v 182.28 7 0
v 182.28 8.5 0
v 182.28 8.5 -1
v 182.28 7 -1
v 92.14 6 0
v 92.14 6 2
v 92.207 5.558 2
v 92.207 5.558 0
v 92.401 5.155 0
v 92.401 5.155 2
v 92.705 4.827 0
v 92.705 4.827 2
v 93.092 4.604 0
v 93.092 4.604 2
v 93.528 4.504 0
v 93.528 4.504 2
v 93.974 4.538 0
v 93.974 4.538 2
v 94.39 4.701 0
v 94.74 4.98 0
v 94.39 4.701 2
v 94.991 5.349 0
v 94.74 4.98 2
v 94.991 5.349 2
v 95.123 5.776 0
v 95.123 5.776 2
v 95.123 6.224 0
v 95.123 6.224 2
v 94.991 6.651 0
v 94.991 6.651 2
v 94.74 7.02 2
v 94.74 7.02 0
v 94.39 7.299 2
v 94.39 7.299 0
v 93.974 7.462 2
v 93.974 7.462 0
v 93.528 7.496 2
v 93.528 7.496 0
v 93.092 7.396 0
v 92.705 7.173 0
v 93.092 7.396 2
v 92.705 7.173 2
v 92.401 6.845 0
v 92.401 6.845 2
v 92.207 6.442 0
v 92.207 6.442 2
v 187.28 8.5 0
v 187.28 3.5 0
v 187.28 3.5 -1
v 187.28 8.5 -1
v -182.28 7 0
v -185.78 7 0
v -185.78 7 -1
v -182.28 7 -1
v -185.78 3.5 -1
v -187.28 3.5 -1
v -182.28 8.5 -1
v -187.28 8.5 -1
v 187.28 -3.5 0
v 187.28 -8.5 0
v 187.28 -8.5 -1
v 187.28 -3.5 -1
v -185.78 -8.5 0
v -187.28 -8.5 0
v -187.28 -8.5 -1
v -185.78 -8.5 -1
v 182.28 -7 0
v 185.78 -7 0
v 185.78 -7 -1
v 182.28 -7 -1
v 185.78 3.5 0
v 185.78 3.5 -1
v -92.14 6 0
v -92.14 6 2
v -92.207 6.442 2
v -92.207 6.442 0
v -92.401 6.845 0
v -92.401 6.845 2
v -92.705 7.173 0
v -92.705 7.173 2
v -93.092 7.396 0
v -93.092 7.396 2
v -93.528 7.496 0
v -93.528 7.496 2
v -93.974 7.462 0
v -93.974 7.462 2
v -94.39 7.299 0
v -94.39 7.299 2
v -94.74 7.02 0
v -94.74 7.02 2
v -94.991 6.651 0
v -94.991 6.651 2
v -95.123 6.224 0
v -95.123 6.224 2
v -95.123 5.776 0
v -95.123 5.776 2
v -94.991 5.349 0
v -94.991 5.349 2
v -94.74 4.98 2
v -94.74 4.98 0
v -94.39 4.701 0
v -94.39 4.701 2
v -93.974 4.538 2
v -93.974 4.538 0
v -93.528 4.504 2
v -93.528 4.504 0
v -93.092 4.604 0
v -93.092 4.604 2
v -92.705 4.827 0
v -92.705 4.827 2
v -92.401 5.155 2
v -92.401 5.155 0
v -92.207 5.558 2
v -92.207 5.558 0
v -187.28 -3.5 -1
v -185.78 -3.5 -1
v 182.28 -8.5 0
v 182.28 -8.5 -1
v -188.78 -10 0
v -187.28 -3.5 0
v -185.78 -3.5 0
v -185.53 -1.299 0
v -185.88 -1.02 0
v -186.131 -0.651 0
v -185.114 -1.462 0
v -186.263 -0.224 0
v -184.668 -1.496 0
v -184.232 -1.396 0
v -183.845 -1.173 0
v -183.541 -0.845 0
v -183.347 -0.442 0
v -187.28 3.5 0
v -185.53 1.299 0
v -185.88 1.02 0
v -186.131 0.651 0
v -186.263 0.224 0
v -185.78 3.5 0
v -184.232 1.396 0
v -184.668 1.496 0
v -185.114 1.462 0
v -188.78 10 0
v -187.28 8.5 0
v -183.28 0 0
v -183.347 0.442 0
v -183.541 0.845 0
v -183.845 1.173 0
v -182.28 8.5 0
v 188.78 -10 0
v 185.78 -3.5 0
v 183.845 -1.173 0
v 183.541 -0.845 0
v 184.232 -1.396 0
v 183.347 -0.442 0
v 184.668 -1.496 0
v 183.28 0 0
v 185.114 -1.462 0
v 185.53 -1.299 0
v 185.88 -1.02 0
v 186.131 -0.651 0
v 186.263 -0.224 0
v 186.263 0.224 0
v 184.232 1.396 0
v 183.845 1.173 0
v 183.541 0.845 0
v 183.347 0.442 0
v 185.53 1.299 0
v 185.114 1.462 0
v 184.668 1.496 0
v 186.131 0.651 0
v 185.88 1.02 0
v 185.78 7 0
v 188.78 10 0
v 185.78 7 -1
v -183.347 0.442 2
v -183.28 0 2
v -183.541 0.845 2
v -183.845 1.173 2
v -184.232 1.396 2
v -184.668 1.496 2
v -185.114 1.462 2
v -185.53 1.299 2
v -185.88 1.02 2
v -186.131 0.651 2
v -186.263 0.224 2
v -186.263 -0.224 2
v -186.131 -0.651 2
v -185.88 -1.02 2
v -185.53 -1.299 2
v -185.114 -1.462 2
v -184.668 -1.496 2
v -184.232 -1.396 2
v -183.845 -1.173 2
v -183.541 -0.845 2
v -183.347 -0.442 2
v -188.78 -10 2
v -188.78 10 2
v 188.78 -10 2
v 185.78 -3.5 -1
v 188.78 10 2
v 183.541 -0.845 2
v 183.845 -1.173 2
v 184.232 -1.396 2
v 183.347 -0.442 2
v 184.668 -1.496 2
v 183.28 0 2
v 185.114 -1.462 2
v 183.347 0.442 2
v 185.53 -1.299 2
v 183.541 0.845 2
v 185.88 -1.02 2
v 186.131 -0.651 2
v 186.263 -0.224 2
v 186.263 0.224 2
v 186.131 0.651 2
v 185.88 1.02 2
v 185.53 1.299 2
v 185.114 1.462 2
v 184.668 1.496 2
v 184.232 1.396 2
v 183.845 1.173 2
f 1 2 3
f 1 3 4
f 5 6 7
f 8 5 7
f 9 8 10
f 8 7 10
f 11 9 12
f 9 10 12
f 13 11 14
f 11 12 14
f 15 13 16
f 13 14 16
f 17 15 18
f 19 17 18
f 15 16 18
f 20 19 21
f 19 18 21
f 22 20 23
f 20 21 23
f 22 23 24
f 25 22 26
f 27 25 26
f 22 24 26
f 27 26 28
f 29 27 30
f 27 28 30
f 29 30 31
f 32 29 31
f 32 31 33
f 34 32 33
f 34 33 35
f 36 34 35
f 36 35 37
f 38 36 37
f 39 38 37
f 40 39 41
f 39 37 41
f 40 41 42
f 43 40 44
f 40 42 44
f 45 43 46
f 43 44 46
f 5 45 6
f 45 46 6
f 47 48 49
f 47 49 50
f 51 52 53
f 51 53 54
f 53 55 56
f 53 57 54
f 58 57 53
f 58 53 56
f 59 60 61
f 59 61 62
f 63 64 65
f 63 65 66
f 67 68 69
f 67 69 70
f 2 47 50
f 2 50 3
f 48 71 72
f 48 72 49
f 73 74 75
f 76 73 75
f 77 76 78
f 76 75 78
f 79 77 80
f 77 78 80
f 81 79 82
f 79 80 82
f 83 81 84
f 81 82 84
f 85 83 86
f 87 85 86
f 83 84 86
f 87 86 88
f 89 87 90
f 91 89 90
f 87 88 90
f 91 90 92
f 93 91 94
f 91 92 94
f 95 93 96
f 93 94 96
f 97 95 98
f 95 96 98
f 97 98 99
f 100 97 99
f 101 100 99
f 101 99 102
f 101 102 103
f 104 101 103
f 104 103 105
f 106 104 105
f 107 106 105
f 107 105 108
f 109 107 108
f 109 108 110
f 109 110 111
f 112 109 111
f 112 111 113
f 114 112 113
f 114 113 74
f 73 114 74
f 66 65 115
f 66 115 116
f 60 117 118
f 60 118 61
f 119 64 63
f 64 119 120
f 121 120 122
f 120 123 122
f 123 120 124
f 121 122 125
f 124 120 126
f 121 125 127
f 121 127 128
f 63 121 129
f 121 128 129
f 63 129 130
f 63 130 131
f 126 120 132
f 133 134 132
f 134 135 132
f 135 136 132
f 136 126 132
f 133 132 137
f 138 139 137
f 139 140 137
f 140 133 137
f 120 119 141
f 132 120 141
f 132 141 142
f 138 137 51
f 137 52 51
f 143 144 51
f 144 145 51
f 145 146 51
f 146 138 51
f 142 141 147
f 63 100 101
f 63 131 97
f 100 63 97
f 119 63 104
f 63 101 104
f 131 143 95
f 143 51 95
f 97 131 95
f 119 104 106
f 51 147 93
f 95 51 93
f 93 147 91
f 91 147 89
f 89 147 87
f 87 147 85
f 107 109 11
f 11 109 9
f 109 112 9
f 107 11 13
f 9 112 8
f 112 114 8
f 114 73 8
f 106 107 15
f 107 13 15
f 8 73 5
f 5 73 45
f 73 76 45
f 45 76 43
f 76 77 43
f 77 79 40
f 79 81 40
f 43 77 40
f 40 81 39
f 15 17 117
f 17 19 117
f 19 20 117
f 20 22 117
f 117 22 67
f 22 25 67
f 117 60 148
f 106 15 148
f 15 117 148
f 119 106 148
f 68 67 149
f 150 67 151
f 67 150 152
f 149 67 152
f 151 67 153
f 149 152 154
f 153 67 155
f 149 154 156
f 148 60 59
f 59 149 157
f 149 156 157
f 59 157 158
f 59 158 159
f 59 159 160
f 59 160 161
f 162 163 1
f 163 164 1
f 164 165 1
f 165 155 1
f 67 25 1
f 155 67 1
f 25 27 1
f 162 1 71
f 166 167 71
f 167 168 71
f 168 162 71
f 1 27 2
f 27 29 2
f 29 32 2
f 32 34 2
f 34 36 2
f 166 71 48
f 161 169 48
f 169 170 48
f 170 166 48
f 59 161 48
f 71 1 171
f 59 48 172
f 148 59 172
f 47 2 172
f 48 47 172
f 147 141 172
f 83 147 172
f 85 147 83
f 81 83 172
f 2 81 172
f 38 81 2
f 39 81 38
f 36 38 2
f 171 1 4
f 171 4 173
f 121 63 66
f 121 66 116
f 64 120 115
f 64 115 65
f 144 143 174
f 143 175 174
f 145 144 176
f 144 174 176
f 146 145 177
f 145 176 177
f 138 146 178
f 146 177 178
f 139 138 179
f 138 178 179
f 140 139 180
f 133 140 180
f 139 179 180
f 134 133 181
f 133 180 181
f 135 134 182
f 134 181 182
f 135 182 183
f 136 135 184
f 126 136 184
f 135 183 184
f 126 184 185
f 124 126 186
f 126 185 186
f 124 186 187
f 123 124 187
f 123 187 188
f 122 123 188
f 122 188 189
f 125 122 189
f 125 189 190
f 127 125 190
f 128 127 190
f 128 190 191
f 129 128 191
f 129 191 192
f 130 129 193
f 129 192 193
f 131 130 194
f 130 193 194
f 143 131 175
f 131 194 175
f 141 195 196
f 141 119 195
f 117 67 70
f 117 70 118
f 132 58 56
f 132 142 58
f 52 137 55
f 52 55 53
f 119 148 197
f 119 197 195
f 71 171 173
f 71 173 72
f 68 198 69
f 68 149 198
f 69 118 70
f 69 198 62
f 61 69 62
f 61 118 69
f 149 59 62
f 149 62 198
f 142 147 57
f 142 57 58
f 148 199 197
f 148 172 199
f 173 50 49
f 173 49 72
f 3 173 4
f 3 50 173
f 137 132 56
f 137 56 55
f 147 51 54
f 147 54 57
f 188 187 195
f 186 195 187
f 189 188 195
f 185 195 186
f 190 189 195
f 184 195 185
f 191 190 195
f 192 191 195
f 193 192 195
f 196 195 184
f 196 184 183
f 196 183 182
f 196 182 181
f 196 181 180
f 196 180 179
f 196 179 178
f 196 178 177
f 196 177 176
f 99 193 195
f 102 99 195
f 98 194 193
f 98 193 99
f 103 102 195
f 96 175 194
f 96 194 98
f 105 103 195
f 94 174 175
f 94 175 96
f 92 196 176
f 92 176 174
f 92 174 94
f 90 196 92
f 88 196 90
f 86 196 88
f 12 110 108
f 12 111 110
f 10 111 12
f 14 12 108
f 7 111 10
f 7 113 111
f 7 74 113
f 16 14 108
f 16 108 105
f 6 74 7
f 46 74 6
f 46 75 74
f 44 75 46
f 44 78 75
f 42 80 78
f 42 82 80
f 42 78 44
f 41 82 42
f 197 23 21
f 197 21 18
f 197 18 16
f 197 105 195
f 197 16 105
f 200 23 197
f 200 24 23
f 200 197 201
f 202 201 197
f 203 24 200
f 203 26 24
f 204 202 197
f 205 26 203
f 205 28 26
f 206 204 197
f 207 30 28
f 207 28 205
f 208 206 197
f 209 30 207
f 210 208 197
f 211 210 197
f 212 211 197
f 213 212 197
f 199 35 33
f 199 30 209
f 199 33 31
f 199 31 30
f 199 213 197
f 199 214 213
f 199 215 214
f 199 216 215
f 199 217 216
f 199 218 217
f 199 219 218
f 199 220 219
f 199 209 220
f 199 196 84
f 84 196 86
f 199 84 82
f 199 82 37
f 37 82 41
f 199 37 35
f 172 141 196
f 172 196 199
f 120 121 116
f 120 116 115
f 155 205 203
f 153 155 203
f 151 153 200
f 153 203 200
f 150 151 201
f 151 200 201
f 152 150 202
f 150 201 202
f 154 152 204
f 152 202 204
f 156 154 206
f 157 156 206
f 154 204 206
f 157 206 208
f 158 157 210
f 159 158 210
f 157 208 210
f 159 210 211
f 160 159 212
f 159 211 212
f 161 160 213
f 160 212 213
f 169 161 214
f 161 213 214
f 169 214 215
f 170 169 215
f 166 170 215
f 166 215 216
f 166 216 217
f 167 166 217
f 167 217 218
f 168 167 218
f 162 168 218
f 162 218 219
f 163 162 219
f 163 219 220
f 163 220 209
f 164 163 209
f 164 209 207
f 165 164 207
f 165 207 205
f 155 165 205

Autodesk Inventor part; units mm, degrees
ref_plane "YZ Plane" through (0, 0, 0) normal (1, 0, 0) x (0, 1, 0)
ref_plane "XZ Plane" through (0, 0, 0) normal (0, 1, 0) x (-1, 0, 0)
ref_plane "XY Plane" through (0, 0, 0) normal (0, 0, 1) x (1, 0, 0)
sketch "Skizze1" plane through (0, 0, 0) normal (0, 0, 1) x (1, 0, 0)
  line L0 (-188.78, 10) -> (188.78, 10)
  line L1 (188.78, 10) -> (188.78, -10)
  line L2 (188.78, -10) -> (-188.78, -10)
  line L3 (-188.78, -10) -> (-188.78, 10)
  line L4 (0, -14) -> (0, 14) construction
  line L5 (-264.292, 0) -> (264.292, 0) construction
  point P0 (0, 0)
  dimension "d0" = 377.56
  dimension "d1" = 20
extrude "Extrusion1" add sketch "Skizze1" along normal blind 2
sketch "Skizze3" plane through (0, 0, 2) normal (0, 0, 1) x (1, 0, 0)
  circle A0 centre (-184.78, 0) radius 1.5
  line L0 (-188.78, 10) -> (-188.78, -10) projected
  line L1 (-264.292, 0) -> (264.292, 0) projected
  circle A1 centre (-93.64, 6) radius 1.5
  line L2 (188.78, 10) -> (-188.78, 10) projected
  line L3 (0, -14) -> (0, 14) projected
  point P0 (0, 0)
  dimension "d8" = 3
  dimension "d9" = 4
  dimension "d10" = 3
  dimension "d11" = 4
  dimension "d12" = 95.14
  dimension "d13" = 93.64
extrude "Extrusion3" cut sketch "Skizze3" against normal through all contours L1 A0 | A0 L1 | A1
mirror "Spiegeln2" about plane through (0, 0, 0) normal (1, 0, 0) of "Extrusion3"
sketch "Skizze4" plane through (0, 0, 0) normal (0, 0, -1) x (-1, 0, 0)
  line L0 (187.28, 8.2503) -> (187.28, 3.5)
  line L1 (187.28, 3.5) -> (185.78, 3.5)
  line L2 (185.78, 3.5) -> (185.78, 7)
  line L3 (185.78, 7) -> (182.28, 7)
  line L4 (182.28, 7) -> (182.28, 8.5)
  line L5 (182.28, 8.5) -> (187.28, 8.5)
  line L6 (187.28, 8.5) -> (187.28, 8.2503)
  line L7 (188.78, 10) -> (188.78, -10) projected
  line L8 (-188.78, 10) -> (188.78, 10) projected
  point P0 (0, 0)
  dimension "d16" = 1.5
  dimension "d17" = 1.5
  dimension "d18" = 1.5
  dimension "d19" = 1.5
  dimension "d20" = 5
  dimension "d21" = 5
extrude "Extrusion4" add sketch "Skizze4" along normal blind 1
mirror "Spiegeln3" about plane through (0, 0, 0) normal (1, 0, 0) of "Extrusion4"
mirror "Spiegeln5" about plane through (0, 0, 0) normal (0, 1, 0) of "Extrusion4", "Spiegeln3"
sketch "Skizze5" plane through (-182.28, -8.5, -1) normal (0, 0, -1) x (-1, 0, 0)
  line L0 (0, 1.5) -> (3.5, 1.5) projected
  line L1 (5, 0) -> (0, 0) projected
  line L2 (3.5, 1.5) -> (0, 1.5)
  line L3 (0, 1.5) -> (0, 0)
  line L4 (0, 0) -> (3.5, 0)
  line L5 (3.5, 0) -> (3.5, 1.5)
  point P0 (-182.28, 8.5)
extrude "Extrusion5" cut sketch "Skizze5" against normal blind 1
properties part number "PCB_Kabelkanaldeckel_1.0"
